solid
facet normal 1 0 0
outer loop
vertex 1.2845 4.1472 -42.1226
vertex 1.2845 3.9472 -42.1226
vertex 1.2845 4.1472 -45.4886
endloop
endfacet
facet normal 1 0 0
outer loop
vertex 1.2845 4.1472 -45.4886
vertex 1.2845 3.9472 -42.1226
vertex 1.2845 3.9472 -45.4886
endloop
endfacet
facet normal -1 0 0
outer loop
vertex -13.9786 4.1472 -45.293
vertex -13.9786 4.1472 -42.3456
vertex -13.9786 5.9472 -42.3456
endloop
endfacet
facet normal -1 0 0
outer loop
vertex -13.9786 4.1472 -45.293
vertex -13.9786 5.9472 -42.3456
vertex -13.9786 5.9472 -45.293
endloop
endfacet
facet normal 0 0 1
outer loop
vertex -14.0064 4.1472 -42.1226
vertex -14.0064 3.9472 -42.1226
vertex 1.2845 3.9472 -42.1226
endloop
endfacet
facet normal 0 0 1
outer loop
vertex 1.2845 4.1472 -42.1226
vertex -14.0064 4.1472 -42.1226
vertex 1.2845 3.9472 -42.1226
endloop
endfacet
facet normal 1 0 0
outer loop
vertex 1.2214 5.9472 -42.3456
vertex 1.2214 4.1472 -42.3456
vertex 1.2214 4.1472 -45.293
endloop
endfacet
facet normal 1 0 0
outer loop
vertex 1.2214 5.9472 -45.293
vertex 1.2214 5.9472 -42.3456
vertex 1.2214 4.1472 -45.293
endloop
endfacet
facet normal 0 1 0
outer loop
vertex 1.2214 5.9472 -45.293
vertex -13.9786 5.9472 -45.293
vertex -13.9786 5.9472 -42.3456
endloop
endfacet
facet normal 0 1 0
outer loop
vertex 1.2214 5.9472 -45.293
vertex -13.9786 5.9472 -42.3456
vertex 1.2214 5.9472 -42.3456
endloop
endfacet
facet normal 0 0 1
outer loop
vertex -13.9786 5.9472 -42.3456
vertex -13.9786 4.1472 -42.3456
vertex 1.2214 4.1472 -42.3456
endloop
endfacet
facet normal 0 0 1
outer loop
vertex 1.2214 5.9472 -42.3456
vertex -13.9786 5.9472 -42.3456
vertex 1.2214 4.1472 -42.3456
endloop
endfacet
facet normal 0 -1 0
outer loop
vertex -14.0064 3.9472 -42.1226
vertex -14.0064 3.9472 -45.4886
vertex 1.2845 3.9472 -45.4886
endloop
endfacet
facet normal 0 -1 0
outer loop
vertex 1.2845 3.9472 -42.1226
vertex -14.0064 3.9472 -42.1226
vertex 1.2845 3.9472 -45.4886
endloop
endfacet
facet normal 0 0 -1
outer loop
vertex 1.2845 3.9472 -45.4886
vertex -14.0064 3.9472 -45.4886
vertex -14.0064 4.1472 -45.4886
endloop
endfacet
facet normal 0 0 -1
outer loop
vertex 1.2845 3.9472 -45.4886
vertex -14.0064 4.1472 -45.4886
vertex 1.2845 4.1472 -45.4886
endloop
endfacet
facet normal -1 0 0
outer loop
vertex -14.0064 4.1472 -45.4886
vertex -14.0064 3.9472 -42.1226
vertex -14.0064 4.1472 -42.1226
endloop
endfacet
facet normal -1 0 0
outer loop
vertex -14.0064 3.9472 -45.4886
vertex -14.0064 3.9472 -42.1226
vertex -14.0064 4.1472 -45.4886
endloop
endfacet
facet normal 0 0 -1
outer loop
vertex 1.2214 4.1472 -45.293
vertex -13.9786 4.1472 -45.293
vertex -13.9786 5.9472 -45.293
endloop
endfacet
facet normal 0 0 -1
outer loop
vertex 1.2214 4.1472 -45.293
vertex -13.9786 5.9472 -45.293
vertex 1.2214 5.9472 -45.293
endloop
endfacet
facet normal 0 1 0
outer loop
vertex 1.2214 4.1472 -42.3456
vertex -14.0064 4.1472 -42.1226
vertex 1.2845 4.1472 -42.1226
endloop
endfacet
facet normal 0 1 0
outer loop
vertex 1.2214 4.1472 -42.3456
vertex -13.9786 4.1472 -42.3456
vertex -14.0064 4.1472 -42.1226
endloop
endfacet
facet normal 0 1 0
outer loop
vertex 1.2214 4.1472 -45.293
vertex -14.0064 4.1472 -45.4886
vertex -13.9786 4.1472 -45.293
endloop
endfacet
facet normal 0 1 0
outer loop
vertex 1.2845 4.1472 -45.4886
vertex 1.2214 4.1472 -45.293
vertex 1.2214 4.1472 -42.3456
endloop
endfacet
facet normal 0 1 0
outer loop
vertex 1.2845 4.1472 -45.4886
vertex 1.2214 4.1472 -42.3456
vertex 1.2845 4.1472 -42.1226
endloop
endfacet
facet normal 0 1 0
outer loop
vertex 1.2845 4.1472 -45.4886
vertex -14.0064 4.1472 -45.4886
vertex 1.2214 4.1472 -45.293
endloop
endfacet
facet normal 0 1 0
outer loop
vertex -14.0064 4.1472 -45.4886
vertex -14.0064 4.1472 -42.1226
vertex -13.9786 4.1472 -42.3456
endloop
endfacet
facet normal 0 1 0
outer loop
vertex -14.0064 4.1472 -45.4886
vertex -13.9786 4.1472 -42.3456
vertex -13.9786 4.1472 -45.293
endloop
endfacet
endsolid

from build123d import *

# Parameters (mm, degrees)
SKETCH1_W           = 76.454565701
SKETCH1_H           = 16.829621381
BOSS_EXTRUDE1_DEPTH = 1
SKETCH3_W           = 76
SKETCH3_H           = 14.736718314
BOSS_EXTRUDE2_DEPTH = 10
SCALE1_SCALE        = 0.2


with BuildPart() as part:
    # Sketch1 → Boss-Extrude1 (new body)
    with BuildSketch(Plane(origin=(0, 0, 0), x_dir=(1, 0, 0), z_dir=(0, 1, 0))):
        with Locations((-6.298094695, 43.757015591)):
            Rectangle(SKETCH1_W, SKETCH1_H)
    extrude(amount=BOSS_EXTRUDE1_DEPTH)

    # Sketch3 → Boss-Extrude2 (add)
    with BuildSketch(Plane(origin=(0, 0, 0), x_dir=(1, 0, 0), z_dir=(0, 1, 0))):
        with Locations((-6.386632835, 43.82550718)):
            Rectangle(SKETCH3_W, SKETCH3_H)
    extrude(amount=BOSS_EXTRUDE2_DEPTH)


with BuildPart() as part_1:
    # Scale1: scaled about (-6.376610315, 4.933999832, -43.81775393)
    add(part.part.scale(SCALE1_SCALE).moved(Location((-5.101288252, 3.947199866, -35.054203144))))


solid = part_1.part
